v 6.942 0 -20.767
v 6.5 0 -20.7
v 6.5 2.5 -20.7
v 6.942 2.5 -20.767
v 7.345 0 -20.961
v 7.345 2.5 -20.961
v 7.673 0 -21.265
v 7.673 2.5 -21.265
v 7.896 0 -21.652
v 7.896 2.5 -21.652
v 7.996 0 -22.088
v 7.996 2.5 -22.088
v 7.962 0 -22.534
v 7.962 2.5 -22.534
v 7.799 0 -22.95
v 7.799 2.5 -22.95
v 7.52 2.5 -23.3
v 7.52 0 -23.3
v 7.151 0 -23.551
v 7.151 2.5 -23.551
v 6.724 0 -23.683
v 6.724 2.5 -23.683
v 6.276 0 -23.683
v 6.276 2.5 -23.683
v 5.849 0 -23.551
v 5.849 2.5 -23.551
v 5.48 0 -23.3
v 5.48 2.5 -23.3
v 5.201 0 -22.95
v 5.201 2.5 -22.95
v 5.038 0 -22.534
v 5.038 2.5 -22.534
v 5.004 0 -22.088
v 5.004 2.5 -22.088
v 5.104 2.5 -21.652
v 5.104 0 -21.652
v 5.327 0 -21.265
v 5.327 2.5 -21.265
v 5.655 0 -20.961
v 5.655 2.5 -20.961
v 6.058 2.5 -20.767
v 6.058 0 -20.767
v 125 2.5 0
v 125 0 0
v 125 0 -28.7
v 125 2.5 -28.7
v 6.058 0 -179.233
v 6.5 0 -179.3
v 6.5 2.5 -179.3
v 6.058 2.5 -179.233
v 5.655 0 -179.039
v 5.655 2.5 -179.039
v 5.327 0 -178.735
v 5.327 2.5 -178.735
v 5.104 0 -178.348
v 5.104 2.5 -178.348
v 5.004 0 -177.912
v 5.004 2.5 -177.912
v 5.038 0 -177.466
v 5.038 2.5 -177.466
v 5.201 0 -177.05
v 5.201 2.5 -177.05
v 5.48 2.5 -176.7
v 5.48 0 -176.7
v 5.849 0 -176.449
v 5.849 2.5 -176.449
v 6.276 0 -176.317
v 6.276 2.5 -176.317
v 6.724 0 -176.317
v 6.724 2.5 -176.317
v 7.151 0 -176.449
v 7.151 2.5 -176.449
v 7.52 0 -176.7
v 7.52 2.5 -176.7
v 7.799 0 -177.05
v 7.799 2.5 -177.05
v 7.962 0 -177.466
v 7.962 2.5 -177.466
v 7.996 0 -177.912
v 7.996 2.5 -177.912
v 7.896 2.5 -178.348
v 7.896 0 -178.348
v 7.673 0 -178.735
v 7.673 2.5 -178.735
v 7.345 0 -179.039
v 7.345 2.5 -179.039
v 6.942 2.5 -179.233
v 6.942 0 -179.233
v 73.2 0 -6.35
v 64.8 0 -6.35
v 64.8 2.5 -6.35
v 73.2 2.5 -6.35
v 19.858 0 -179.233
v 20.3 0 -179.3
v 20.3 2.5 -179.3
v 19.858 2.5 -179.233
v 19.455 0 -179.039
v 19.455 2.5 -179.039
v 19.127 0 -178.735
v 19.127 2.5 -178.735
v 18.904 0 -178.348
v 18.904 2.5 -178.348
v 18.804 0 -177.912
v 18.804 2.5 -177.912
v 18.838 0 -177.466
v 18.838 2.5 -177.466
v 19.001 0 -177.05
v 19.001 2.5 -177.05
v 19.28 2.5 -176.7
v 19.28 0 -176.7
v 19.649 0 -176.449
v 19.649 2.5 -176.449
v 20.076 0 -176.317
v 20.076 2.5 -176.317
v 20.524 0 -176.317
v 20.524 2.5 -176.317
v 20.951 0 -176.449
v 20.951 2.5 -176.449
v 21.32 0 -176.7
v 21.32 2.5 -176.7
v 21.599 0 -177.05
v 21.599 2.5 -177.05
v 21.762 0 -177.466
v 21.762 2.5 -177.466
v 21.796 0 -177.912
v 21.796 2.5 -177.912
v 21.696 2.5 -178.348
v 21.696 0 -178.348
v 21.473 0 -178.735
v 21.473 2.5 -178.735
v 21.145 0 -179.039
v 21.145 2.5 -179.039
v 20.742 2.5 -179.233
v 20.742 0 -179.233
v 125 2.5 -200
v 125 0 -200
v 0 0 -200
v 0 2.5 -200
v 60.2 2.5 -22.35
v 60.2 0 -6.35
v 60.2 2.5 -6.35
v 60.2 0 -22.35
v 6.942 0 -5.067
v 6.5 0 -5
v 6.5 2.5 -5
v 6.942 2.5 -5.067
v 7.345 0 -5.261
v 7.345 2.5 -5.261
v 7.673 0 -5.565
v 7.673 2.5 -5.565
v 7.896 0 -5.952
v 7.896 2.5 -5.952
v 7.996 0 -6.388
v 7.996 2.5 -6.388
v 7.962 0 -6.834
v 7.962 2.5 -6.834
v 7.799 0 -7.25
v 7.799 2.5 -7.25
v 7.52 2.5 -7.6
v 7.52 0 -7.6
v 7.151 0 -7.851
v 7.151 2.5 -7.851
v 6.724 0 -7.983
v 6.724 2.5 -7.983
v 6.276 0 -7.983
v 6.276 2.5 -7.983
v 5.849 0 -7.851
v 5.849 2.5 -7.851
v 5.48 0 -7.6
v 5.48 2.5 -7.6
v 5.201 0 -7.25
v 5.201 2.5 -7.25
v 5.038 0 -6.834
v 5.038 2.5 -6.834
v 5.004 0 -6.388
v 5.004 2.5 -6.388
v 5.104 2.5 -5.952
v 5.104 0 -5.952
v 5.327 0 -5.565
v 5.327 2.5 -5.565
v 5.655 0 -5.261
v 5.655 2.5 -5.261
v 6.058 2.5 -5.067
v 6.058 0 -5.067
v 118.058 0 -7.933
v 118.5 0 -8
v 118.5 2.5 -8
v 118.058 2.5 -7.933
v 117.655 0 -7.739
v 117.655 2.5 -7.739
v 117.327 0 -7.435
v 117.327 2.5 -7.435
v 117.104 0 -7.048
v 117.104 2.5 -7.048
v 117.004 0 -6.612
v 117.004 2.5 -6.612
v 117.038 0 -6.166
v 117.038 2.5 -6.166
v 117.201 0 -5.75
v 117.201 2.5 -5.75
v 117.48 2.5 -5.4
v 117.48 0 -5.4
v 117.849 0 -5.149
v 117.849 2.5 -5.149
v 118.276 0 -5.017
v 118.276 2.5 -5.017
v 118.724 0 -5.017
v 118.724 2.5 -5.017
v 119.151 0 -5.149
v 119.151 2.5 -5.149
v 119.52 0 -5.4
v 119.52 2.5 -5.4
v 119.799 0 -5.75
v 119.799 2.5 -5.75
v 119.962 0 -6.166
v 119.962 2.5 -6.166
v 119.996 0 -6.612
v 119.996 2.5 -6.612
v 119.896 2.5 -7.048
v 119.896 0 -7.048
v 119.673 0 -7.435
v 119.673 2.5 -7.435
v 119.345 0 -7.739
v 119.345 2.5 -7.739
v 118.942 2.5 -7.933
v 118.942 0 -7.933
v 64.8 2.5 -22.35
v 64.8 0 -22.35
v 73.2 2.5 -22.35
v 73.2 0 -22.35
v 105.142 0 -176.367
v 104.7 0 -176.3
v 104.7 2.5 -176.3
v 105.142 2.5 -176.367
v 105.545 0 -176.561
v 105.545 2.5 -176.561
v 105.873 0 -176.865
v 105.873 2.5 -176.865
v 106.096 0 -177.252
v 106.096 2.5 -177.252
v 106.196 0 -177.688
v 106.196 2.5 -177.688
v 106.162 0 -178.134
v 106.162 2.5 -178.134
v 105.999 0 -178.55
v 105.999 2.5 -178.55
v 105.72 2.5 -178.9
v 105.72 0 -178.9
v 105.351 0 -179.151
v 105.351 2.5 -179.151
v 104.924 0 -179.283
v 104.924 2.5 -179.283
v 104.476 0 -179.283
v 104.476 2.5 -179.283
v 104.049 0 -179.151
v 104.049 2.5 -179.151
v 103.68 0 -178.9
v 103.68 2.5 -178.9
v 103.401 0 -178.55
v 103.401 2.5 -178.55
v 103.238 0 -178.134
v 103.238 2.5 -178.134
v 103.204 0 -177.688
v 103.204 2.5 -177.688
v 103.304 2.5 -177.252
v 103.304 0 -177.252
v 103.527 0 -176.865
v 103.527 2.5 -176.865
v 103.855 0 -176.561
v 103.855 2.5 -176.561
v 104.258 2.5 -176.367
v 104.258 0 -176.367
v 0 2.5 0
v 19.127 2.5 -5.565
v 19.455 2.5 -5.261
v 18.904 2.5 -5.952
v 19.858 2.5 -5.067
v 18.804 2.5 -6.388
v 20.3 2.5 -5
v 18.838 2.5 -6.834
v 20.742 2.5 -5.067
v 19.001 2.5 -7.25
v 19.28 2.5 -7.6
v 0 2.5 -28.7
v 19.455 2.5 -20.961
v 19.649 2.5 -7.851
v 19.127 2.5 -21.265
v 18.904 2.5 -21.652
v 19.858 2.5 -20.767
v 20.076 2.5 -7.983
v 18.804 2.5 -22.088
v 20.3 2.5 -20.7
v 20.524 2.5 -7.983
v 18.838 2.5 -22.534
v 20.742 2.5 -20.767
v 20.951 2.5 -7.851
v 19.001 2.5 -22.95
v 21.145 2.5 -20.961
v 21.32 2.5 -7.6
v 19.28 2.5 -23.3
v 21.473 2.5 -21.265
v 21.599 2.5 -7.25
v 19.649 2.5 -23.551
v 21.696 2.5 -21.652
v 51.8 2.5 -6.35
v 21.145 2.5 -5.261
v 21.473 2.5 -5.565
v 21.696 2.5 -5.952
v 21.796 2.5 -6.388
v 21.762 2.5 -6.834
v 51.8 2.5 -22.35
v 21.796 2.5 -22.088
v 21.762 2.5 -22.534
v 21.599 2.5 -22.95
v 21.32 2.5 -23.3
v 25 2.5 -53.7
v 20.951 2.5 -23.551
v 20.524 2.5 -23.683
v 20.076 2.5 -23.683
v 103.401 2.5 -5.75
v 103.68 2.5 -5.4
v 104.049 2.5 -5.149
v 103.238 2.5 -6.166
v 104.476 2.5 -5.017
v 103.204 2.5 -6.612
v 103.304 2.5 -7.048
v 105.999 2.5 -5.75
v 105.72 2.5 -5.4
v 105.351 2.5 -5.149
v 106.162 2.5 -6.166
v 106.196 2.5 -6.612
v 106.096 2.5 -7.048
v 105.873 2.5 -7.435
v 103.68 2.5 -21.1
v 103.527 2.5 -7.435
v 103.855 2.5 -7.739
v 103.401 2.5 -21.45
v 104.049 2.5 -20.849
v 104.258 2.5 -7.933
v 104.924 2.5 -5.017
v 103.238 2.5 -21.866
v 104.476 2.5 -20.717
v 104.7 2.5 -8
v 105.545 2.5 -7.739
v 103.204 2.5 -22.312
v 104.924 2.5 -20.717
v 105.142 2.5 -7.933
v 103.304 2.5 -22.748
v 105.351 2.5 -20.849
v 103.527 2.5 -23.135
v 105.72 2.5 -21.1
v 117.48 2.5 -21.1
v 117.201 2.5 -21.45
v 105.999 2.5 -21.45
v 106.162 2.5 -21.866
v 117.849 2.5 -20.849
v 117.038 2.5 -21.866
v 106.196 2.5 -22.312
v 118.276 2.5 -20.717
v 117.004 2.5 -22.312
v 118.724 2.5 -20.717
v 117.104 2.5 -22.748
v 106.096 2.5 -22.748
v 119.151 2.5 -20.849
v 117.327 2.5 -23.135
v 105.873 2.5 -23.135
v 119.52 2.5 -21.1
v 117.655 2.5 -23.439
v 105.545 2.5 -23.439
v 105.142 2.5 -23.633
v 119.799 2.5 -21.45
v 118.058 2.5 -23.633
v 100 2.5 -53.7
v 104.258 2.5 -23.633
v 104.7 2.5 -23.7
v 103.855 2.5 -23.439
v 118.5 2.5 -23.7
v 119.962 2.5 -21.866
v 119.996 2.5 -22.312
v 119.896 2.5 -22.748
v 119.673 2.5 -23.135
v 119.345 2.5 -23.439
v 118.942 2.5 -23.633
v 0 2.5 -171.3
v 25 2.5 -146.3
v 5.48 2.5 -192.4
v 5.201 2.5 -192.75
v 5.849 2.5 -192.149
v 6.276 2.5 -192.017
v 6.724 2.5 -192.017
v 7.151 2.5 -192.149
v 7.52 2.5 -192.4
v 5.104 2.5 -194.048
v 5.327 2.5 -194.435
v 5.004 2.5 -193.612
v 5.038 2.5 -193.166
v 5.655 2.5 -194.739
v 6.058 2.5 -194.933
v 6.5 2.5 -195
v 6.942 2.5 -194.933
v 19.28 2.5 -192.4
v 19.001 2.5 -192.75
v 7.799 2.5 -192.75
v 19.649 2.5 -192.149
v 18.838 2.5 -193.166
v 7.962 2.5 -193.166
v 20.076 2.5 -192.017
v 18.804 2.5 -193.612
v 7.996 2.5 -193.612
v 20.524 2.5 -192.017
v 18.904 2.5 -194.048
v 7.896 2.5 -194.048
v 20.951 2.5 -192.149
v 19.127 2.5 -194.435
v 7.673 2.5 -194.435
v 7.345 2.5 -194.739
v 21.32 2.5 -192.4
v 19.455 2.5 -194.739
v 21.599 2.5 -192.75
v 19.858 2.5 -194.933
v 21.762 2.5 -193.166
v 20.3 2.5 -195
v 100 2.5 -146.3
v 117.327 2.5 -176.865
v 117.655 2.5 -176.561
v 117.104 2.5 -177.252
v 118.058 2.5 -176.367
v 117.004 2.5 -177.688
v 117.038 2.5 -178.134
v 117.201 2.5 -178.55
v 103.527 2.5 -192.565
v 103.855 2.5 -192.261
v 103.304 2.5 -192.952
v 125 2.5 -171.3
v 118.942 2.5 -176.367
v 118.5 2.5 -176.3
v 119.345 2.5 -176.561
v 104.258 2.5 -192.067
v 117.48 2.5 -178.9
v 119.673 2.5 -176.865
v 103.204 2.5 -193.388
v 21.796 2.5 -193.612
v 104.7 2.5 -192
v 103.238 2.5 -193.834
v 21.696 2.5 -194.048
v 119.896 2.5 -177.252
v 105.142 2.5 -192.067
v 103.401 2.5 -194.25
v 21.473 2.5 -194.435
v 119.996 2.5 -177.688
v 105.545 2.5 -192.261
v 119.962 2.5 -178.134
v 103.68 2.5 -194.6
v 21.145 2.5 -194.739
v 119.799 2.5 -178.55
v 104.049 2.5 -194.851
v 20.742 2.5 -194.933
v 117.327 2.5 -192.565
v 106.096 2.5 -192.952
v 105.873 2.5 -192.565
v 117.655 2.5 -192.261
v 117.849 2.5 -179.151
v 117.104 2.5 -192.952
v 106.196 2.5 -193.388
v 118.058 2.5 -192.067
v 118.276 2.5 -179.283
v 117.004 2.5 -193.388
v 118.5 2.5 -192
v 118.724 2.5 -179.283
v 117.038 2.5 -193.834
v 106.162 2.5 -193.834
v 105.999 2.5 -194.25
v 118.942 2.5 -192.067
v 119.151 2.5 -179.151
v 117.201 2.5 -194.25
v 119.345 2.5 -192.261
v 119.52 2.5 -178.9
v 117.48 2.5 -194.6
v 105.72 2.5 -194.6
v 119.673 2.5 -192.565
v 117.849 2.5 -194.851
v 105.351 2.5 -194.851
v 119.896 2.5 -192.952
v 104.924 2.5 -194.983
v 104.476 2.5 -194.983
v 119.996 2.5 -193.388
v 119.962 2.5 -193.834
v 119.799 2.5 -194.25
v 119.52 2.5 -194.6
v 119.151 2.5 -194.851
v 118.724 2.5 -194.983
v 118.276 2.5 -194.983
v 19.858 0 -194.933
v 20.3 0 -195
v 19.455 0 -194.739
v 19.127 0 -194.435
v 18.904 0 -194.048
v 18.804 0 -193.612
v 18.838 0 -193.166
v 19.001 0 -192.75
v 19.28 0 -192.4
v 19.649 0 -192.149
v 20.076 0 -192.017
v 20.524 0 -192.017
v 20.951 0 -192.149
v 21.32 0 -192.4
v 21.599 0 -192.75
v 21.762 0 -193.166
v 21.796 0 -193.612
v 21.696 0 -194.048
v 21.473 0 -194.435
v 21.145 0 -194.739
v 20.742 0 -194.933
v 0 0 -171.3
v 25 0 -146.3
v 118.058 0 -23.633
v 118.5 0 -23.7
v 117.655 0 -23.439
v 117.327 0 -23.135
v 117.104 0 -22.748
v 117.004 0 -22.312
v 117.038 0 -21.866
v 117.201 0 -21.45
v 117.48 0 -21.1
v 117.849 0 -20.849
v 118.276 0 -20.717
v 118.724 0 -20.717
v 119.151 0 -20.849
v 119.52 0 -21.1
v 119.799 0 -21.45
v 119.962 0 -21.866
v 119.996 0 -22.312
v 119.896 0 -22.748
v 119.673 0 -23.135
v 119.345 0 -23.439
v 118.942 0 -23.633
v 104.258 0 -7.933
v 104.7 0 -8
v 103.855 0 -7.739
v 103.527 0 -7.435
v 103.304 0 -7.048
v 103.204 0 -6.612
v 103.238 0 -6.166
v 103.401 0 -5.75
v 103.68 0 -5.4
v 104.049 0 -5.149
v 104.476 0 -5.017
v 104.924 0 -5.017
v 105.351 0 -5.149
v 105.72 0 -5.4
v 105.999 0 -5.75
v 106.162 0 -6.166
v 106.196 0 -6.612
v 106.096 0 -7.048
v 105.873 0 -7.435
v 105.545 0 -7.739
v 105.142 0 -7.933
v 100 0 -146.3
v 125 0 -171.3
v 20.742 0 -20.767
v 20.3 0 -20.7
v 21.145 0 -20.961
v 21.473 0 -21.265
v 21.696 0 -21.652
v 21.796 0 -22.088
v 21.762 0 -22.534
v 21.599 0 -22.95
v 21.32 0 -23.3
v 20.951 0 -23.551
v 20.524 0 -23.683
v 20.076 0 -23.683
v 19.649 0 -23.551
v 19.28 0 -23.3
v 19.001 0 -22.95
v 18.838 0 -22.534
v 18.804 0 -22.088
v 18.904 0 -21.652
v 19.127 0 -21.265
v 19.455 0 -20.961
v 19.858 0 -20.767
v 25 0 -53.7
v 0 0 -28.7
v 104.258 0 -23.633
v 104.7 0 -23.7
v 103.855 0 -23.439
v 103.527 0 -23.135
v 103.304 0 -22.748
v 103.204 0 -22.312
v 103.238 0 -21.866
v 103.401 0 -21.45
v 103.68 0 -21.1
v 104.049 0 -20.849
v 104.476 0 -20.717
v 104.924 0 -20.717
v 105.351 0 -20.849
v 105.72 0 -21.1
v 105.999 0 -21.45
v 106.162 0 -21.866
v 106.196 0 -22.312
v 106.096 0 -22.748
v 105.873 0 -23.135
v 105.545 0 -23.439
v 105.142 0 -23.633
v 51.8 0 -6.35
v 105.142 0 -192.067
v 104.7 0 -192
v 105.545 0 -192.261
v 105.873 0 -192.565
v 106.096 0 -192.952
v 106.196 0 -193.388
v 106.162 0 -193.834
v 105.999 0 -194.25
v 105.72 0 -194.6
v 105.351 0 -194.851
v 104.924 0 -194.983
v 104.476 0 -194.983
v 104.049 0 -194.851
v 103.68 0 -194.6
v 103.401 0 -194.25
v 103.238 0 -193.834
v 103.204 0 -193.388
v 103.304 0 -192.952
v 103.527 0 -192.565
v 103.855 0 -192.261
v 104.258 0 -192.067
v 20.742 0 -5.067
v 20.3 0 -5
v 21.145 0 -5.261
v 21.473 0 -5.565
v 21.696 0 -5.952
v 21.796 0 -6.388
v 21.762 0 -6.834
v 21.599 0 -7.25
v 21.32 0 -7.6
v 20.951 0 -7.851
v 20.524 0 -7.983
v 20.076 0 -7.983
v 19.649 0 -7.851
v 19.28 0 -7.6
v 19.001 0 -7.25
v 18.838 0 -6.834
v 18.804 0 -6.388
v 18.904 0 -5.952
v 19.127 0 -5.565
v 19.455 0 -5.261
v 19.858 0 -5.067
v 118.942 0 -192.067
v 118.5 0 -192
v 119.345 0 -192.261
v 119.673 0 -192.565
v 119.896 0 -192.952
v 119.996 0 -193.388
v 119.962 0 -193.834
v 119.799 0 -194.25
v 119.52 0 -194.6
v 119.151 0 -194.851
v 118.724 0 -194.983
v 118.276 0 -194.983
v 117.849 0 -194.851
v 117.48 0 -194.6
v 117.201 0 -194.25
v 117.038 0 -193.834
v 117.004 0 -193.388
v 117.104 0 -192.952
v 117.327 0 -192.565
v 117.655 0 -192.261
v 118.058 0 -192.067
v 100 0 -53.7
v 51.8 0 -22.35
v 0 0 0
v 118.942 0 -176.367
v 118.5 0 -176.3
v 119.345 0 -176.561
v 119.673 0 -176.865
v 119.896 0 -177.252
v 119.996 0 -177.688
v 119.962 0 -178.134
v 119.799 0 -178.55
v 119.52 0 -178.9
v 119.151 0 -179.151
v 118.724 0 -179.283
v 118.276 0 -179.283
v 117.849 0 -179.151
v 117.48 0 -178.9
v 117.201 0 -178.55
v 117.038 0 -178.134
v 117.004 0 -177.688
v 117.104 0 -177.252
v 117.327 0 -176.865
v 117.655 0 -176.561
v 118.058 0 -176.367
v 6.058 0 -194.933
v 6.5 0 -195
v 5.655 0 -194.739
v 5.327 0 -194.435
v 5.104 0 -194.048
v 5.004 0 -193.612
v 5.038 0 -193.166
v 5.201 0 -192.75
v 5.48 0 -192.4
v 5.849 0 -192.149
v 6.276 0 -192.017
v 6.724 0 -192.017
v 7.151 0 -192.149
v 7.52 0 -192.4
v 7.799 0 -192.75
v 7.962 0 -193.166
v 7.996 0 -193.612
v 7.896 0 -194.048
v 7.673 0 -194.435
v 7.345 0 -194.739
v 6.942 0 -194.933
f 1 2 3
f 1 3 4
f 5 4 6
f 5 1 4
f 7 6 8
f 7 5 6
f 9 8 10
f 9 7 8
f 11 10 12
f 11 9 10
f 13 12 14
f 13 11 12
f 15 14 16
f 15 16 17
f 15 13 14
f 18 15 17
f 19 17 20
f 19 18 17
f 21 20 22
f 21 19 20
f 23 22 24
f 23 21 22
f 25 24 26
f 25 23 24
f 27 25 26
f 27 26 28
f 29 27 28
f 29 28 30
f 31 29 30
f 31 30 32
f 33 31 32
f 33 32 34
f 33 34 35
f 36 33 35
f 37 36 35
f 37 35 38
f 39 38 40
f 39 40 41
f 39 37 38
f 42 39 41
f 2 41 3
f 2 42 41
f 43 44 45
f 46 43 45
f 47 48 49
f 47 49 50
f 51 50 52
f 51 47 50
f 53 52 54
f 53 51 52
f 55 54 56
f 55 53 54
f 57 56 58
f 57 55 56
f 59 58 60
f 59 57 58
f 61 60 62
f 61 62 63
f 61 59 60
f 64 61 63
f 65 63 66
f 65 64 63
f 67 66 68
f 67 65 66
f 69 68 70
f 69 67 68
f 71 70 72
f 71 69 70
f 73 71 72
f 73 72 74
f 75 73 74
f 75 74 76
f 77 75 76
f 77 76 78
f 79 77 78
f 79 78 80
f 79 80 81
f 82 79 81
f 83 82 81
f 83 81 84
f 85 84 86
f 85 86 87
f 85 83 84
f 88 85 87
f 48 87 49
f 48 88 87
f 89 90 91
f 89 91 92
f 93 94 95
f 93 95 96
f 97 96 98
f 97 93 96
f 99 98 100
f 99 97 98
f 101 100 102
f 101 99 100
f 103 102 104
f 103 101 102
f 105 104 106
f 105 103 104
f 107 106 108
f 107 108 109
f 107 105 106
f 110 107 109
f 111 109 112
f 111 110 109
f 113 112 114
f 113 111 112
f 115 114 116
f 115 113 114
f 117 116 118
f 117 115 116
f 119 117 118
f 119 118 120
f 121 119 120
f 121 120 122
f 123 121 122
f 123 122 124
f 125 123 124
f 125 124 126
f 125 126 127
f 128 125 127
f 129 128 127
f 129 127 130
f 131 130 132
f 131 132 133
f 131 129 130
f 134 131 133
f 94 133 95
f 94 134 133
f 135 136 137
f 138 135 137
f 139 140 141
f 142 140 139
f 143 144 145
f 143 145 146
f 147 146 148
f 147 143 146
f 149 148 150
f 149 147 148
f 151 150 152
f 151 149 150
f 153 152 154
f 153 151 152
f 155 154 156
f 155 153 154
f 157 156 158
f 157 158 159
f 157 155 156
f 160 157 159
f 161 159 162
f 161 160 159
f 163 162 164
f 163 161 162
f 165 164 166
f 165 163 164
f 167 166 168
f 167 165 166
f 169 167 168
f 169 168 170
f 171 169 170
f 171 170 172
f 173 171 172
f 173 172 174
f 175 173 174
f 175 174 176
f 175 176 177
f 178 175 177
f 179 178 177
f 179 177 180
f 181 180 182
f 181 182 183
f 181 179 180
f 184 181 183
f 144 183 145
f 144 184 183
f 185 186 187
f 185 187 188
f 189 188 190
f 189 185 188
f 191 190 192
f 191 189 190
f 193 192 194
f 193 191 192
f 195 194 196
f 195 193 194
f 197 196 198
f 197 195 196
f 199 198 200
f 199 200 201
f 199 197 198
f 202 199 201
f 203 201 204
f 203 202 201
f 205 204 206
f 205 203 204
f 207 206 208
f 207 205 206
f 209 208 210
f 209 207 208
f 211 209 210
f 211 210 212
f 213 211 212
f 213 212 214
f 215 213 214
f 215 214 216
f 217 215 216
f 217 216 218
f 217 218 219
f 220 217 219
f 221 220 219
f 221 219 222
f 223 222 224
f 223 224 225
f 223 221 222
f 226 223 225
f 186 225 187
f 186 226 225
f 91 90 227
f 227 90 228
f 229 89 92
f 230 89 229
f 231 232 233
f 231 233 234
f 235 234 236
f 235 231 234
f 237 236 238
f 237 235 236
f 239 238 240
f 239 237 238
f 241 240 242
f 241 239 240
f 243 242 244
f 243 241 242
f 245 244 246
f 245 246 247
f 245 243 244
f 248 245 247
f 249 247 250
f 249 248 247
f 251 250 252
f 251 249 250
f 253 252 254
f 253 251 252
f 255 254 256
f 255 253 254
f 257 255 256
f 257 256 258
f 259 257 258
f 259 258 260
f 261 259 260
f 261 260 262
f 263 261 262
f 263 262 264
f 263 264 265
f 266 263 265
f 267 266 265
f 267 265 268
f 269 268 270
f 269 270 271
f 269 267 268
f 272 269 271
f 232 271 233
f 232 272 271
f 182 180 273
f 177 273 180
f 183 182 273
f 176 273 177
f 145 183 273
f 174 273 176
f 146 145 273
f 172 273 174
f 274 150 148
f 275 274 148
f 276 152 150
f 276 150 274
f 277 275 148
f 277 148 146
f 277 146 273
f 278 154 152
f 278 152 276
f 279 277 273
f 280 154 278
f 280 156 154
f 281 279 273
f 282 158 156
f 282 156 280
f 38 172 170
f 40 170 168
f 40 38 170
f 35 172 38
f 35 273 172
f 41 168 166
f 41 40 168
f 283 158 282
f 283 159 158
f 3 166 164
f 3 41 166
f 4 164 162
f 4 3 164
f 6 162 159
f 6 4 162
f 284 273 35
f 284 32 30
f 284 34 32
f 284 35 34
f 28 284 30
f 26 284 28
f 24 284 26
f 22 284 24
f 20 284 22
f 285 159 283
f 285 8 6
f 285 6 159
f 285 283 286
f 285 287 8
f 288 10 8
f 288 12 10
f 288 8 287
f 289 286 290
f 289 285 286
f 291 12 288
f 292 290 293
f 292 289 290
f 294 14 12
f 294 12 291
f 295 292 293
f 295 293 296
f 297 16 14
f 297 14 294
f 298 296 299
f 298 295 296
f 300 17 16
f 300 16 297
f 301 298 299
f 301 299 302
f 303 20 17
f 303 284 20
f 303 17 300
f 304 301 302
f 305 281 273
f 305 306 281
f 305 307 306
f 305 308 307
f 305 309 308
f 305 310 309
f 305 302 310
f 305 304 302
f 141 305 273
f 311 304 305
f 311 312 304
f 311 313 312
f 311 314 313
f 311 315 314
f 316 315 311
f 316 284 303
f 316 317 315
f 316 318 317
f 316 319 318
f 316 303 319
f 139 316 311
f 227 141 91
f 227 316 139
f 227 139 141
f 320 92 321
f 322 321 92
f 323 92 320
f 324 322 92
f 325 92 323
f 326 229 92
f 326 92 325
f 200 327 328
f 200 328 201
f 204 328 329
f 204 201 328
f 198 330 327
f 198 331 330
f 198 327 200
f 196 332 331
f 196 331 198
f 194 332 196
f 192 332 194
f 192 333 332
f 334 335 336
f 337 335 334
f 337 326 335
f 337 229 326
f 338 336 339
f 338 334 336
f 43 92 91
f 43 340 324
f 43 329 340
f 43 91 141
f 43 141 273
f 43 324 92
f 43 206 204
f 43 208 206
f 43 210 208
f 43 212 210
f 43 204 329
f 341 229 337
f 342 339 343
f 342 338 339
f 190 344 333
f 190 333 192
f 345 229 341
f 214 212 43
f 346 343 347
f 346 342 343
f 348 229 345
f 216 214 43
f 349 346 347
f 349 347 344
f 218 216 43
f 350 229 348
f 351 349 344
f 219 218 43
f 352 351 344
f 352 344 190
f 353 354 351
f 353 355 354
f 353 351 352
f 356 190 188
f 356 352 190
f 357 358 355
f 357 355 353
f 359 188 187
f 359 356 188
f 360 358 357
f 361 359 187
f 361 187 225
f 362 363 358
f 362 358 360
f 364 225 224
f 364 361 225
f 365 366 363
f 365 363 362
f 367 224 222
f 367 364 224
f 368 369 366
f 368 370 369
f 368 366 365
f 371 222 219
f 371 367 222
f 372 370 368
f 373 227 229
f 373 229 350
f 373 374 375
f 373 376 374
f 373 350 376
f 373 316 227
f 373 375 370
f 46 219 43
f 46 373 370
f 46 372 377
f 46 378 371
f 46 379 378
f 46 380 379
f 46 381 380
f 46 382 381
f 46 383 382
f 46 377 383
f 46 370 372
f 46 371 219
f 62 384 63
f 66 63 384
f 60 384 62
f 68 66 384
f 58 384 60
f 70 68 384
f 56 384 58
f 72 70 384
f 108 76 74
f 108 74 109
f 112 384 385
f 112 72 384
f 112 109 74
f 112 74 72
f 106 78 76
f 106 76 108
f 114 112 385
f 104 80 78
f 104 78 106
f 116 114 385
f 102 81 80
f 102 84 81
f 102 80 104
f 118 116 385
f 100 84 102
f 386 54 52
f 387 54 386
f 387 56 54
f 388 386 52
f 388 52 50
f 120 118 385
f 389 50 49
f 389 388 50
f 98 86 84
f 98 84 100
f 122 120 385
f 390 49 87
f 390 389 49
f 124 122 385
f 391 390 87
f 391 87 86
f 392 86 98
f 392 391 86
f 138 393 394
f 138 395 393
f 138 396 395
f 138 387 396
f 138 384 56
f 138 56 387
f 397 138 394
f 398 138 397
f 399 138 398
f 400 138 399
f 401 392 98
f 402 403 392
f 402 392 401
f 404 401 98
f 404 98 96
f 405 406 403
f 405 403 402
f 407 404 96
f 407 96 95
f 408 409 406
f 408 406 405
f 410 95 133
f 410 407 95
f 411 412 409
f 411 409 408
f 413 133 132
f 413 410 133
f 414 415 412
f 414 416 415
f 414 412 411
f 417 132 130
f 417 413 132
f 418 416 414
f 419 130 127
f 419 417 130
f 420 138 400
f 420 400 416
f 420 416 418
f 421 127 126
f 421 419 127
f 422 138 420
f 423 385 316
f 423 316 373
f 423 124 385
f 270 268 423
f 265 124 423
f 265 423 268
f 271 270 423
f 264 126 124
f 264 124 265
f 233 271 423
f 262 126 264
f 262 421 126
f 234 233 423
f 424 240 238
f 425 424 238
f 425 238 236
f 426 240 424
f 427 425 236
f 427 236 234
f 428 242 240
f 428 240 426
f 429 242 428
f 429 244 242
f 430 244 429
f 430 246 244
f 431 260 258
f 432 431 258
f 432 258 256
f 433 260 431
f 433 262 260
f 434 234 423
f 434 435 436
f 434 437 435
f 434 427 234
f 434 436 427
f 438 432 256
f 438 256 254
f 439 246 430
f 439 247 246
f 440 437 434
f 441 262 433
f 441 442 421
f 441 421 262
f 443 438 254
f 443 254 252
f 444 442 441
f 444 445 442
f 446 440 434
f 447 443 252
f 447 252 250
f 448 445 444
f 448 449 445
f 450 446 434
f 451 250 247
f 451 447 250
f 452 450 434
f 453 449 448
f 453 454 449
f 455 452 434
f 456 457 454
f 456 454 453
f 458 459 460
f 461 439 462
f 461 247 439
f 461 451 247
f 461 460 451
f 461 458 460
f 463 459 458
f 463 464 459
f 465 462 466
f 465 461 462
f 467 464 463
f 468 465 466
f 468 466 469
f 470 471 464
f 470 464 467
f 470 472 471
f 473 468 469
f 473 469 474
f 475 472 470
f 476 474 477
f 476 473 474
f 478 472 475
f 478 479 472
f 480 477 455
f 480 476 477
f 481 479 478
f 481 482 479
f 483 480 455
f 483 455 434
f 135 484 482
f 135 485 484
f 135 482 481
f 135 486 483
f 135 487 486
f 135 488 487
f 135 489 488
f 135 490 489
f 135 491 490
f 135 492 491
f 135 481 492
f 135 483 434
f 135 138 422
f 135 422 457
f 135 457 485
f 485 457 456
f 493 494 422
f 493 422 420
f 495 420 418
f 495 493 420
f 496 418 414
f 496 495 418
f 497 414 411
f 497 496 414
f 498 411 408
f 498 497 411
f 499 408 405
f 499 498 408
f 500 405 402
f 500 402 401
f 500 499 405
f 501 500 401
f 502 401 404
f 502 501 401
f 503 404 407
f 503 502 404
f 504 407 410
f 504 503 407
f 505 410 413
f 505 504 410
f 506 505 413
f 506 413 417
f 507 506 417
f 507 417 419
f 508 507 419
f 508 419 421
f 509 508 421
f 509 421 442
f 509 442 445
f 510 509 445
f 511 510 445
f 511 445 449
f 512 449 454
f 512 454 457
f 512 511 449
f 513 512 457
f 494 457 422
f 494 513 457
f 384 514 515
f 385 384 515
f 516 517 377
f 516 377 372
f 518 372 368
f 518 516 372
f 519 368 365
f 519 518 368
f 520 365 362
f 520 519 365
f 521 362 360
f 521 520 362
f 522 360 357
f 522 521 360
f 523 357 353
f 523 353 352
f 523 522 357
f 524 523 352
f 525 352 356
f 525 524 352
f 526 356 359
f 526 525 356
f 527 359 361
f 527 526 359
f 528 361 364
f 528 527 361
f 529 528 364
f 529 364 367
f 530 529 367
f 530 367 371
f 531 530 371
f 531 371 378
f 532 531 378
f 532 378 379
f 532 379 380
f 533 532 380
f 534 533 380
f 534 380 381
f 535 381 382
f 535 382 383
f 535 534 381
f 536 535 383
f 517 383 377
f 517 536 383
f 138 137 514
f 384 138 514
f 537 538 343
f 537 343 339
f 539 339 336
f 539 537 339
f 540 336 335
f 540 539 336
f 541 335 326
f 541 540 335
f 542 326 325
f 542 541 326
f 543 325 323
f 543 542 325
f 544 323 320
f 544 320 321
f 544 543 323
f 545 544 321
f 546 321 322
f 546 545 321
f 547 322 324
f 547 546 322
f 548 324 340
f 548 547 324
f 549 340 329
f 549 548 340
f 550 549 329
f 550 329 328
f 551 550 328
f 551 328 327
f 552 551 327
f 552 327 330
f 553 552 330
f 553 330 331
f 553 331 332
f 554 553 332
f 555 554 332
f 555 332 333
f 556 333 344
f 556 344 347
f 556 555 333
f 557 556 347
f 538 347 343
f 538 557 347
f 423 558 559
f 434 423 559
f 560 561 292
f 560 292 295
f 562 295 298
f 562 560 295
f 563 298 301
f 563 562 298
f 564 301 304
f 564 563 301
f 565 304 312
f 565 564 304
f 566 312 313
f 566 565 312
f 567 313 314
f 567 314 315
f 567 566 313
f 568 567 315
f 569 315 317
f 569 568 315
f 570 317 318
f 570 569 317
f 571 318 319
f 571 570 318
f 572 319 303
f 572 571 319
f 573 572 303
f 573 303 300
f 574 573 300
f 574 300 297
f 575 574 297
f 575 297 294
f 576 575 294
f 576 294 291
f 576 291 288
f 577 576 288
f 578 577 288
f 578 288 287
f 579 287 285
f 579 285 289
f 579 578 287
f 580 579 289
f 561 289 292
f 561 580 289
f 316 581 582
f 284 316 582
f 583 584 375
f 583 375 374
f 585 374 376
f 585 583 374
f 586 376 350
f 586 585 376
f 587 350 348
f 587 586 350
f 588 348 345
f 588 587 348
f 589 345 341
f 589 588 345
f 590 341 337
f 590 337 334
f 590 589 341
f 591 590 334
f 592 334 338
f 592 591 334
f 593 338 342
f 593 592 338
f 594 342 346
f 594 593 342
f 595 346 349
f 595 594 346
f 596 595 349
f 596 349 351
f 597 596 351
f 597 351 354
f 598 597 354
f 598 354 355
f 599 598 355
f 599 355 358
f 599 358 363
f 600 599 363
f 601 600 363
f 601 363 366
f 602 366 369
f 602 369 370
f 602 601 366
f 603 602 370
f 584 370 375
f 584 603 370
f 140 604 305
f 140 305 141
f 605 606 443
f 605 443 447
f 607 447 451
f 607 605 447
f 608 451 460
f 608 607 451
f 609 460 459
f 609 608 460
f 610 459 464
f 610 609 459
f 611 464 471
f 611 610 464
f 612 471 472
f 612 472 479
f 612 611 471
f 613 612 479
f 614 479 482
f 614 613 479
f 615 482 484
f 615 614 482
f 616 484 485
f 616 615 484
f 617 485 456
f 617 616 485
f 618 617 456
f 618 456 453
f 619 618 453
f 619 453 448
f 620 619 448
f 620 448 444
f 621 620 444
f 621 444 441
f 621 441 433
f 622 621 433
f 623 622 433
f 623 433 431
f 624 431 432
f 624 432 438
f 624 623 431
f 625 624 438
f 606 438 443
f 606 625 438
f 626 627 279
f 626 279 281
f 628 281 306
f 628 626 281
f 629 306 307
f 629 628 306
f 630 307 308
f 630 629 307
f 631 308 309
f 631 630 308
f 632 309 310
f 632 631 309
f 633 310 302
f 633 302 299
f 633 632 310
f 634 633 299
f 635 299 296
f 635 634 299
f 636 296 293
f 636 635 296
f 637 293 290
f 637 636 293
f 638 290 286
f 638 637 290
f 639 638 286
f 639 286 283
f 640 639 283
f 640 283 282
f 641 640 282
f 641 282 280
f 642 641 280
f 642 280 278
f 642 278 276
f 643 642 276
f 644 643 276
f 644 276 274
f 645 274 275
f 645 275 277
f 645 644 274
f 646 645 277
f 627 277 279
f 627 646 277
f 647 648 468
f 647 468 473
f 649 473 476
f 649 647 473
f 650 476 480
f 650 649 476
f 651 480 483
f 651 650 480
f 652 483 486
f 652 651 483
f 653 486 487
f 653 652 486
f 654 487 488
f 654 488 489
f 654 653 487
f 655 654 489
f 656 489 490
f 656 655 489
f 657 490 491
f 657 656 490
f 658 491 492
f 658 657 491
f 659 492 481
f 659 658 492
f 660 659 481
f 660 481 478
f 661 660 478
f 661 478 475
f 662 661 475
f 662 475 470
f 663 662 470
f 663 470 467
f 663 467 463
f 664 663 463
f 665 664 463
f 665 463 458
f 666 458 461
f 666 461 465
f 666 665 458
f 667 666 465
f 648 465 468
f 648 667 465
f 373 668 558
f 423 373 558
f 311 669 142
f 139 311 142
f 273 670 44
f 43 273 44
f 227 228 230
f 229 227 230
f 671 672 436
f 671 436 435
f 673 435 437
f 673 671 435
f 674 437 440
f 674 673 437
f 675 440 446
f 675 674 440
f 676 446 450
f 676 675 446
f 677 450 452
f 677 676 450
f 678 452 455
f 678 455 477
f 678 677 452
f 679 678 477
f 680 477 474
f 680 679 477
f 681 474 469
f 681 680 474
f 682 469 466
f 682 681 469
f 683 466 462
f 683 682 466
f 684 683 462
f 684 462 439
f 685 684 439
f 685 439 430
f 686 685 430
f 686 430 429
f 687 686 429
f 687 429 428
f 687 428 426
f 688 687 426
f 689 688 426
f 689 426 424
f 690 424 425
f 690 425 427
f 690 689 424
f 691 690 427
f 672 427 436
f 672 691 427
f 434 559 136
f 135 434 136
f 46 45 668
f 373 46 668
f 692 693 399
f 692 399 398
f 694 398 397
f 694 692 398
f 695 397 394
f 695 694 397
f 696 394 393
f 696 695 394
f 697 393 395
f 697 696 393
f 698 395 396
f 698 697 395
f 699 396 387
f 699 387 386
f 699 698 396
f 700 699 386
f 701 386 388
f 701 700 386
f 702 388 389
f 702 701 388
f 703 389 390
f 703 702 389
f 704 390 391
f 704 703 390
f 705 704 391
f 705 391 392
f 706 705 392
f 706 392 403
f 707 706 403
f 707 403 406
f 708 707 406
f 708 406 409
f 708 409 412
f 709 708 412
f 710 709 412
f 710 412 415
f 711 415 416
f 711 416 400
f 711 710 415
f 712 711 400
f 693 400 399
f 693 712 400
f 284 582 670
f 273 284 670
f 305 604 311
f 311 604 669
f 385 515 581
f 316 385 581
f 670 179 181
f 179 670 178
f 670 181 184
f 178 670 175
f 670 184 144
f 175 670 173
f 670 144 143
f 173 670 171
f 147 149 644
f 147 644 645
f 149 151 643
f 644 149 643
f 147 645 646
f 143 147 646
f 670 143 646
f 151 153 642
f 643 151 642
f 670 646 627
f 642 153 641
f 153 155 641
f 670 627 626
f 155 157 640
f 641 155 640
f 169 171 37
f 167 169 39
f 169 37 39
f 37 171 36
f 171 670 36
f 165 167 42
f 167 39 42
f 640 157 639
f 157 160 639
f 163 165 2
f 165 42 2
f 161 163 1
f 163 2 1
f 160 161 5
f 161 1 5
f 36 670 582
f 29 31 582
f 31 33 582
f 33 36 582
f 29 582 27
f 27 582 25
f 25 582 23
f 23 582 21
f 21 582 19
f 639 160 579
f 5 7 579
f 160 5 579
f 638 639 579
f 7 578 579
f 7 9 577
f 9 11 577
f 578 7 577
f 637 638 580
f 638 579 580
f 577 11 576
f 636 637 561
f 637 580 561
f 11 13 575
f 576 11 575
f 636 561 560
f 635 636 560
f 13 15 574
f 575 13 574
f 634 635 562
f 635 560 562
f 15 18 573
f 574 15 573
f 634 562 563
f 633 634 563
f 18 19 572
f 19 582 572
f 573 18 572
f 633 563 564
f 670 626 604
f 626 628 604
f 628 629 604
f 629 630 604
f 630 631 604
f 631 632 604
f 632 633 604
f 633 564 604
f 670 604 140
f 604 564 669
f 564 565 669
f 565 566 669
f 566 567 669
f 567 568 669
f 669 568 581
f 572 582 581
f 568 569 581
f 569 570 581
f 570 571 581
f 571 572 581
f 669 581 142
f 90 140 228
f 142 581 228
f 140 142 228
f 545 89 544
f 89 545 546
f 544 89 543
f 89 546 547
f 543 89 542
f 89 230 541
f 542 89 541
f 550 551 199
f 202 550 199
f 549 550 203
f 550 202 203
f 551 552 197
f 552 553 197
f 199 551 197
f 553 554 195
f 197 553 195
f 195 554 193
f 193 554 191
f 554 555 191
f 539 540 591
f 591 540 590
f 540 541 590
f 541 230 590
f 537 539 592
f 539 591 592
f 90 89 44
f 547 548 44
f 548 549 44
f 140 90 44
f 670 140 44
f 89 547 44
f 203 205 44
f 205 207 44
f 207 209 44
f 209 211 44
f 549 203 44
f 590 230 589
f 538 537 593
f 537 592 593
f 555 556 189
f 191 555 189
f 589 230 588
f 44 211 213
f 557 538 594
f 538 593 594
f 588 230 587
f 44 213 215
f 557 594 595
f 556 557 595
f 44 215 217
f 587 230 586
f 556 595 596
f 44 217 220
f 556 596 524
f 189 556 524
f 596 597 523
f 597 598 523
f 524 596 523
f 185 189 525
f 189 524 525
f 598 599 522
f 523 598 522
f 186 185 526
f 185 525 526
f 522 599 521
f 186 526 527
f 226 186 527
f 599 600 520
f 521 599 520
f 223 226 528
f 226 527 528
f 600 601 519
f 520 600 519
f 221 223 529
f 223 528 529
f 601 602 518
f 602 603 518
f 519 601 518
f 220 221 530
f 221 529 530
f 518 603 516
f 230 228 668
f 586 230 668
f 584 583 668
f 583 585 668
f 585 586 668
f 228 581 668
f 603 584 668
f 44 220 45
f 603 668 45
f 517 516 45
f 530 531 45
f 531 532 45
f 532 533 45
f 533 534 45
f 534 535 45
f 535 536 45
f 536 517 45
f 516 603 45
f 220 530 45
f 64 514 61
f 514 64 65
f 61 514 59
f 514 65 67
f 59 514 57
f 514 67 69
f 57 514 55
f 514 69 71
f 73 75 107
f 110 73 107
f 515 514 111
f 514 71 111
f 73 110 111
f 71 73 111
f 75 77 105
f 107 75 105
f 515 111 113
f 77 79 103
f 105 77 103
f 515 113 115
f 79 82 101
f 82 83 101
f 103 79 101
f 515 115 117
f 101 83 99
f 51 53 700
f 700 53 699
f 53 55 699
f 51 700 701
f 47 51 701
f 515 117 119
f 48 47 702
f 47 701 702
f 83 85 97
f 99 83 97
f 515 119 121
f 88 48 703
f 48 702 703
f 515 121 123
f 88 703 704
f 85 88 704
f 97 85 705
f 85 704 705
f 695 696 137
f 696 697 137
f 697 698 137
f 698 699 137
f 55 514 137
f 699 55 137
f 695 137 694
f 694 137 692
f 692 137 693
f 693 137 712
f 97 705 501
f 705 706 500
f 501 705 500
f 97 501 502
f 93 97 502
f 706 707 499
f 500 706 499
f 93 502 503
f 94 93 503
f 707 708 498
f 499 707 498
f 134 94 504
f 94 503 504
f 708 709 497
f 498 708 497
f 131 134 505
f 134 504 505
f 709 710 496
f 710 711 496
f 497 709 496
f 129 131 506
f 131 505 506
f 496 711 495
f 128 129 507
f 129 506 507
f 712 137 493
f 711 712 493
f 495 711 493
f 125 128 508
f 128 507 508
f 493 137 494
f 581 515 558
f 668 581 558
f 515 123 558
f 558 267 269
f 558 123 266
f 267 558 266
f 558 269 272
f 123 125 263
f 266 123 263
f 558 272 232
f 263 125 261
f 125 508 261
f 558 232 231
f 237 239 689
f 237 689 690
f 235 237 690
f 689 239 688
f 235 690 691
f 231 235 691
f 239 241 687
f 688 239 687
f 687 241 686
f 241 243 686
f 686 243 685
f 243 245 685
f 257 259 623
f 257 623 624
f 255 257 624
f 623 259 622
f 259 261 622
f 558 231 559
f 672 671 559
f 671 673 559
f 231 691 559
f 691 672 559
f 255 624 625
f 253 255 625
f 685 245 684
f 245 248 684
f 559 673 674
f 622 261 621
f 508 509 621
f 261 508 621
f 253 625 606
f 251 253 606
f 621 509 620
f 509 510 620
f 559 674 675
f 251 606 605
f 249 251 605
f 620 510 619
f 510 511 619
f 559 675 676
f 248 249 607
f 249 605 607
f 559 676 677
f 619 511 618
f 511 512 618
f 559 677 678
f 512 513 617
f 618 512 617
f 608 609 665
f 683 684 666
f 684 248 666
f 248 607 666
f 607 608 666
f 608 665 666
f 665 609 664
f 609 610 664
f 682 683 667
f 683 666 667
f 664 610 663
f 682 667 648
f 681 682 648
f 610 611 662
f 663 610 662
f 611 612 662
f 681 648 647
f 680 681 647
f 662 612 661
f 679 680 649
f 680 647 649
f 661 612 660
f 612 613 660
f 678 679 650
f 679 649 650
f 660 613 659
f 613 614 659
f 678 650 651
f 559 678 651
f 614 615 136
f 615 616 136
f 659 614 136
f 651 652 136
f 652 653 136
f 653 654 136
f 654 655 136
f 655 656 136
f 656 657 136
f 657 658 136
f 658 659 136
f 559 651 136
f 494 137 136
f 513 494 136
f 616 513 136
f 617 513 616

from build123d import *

# Parameters (mm, degrees)
SKETCH1_R           = 1.5
SKETCH1_W           = 8.4
SKETCH1_H           = 16
BOSS_EXTRUDE1_DEPTH = 2.5


with BuildPart() as part:
    # Sketch1 → Boss-Extrude1 (new body)
    with BuildSketch(Plane(origin=(0, 0, 0), x_dir=(1, 0, 0), z_dir=(0, 1, 0))):
        Polygon((0, 0), (125, 0), (125, 28.7), (100, 53.7), (100, 146.3), (125, 171.3), (125, 200), (0, 200), (0, 171.3), (25, 146.3), (25, 53.7), (0, 28.7), align=None)
        with Locations(Location((6.5, 6.5, 0), (0, 0, 270))):
            Circle(SKETCH1_R, mode=Mode.SUBTRACT)
        with Locations(Location((6.5, 22.2, 0), (0, 0, 270))):
            Circle(SKETCH1_R, mode=Mode.SUBTRACT)
        with Locations(Location((20.3, 6.5, 0), (0, 0, 270))):
            Circle(SKETCH1_R, mode=Mode.SUBTRACT)
        with Locations(Location((20.3, 22.2, 0), (0, 0, 270))):
            Circle(SKETCH1_R, mode=Mode.SUBTRACT)
        with Locations(Location((104.7, 6.5, 0), (0, 0, 90))):
            Circle(SKETCH1_R, mode=Mode.SUBTRACT)
        with Locations(Location((118.5, 6.5, 0), (0, 0, 90))):
            Circle(SKETCH1_R, mode=Mode.SUBTRACT)
        with Locations(Location((104.7, 22.2, 0), (0, 0, 90))):
            Circle(SKETCH1_R, mode=Mode.SUBTRACT)
        with Locations(Location((118.5, 22.2, 0), (0, 0, 90))):
            Circle(SKETCH1_R, mode=Mode.SUBTRACT)
        with Locations(Location((118.5, 177.8, 0), (0, 0, 270))):
            Circle(SKETCH1_R, mode=Mode.SUBTRACT)
        with Locations(Location((118.5, 193.5, 0), (0, 0, 270))):
            Circle(SKETCH1_R, mode=Mode.SUBTRACT)
        with Locations(Location((104.7, 193.5, 0), (0, 0, 270))):
            Circle(SKETCH1_R, mode=Mode.SUBTRACT)
        with Locations(Location((104.7, 177.8, 0), (0, 0, 270))):
            Circle(SKETCH1_R, mode=Mode.SUBTRACT)
        with Locations(Location((20.3, 193.5, 0), (0, 0, 90))):
            Circle(SKETCH1_R, mode=Mode.SUBTRACT)
        with Locations(Location((20.3, 177.8, 0), (0, 0, 90))):
            Circle(SKETCH1_R, mode=Mode.SUBTRACT)
        with Locations(Location((6.5, 193.5, 0), (0, 0, 90))):
            Circle(SKETCH1_R, mode=Mode.SUBTRACT)
        with Locations(Location((6.5, 177.8, 0), (0, 0, 90))):
            Circle(SKETCH1_R, mode=Mode.SUBTRACT)
        with Locations((56, 14.35)):
            Rectangle(SKETCH1_W, SKETCH1_H, mode=Mode.SUBTRACT)
        with Locations((69, 14.35)):
            Rectangle(SKETCH1_W, SKETCH1_H, mode=Mode.SUBTRACT)
    extrude(amount=BOSS_EXTRUDE1_DEPTH)


solid = part.part
